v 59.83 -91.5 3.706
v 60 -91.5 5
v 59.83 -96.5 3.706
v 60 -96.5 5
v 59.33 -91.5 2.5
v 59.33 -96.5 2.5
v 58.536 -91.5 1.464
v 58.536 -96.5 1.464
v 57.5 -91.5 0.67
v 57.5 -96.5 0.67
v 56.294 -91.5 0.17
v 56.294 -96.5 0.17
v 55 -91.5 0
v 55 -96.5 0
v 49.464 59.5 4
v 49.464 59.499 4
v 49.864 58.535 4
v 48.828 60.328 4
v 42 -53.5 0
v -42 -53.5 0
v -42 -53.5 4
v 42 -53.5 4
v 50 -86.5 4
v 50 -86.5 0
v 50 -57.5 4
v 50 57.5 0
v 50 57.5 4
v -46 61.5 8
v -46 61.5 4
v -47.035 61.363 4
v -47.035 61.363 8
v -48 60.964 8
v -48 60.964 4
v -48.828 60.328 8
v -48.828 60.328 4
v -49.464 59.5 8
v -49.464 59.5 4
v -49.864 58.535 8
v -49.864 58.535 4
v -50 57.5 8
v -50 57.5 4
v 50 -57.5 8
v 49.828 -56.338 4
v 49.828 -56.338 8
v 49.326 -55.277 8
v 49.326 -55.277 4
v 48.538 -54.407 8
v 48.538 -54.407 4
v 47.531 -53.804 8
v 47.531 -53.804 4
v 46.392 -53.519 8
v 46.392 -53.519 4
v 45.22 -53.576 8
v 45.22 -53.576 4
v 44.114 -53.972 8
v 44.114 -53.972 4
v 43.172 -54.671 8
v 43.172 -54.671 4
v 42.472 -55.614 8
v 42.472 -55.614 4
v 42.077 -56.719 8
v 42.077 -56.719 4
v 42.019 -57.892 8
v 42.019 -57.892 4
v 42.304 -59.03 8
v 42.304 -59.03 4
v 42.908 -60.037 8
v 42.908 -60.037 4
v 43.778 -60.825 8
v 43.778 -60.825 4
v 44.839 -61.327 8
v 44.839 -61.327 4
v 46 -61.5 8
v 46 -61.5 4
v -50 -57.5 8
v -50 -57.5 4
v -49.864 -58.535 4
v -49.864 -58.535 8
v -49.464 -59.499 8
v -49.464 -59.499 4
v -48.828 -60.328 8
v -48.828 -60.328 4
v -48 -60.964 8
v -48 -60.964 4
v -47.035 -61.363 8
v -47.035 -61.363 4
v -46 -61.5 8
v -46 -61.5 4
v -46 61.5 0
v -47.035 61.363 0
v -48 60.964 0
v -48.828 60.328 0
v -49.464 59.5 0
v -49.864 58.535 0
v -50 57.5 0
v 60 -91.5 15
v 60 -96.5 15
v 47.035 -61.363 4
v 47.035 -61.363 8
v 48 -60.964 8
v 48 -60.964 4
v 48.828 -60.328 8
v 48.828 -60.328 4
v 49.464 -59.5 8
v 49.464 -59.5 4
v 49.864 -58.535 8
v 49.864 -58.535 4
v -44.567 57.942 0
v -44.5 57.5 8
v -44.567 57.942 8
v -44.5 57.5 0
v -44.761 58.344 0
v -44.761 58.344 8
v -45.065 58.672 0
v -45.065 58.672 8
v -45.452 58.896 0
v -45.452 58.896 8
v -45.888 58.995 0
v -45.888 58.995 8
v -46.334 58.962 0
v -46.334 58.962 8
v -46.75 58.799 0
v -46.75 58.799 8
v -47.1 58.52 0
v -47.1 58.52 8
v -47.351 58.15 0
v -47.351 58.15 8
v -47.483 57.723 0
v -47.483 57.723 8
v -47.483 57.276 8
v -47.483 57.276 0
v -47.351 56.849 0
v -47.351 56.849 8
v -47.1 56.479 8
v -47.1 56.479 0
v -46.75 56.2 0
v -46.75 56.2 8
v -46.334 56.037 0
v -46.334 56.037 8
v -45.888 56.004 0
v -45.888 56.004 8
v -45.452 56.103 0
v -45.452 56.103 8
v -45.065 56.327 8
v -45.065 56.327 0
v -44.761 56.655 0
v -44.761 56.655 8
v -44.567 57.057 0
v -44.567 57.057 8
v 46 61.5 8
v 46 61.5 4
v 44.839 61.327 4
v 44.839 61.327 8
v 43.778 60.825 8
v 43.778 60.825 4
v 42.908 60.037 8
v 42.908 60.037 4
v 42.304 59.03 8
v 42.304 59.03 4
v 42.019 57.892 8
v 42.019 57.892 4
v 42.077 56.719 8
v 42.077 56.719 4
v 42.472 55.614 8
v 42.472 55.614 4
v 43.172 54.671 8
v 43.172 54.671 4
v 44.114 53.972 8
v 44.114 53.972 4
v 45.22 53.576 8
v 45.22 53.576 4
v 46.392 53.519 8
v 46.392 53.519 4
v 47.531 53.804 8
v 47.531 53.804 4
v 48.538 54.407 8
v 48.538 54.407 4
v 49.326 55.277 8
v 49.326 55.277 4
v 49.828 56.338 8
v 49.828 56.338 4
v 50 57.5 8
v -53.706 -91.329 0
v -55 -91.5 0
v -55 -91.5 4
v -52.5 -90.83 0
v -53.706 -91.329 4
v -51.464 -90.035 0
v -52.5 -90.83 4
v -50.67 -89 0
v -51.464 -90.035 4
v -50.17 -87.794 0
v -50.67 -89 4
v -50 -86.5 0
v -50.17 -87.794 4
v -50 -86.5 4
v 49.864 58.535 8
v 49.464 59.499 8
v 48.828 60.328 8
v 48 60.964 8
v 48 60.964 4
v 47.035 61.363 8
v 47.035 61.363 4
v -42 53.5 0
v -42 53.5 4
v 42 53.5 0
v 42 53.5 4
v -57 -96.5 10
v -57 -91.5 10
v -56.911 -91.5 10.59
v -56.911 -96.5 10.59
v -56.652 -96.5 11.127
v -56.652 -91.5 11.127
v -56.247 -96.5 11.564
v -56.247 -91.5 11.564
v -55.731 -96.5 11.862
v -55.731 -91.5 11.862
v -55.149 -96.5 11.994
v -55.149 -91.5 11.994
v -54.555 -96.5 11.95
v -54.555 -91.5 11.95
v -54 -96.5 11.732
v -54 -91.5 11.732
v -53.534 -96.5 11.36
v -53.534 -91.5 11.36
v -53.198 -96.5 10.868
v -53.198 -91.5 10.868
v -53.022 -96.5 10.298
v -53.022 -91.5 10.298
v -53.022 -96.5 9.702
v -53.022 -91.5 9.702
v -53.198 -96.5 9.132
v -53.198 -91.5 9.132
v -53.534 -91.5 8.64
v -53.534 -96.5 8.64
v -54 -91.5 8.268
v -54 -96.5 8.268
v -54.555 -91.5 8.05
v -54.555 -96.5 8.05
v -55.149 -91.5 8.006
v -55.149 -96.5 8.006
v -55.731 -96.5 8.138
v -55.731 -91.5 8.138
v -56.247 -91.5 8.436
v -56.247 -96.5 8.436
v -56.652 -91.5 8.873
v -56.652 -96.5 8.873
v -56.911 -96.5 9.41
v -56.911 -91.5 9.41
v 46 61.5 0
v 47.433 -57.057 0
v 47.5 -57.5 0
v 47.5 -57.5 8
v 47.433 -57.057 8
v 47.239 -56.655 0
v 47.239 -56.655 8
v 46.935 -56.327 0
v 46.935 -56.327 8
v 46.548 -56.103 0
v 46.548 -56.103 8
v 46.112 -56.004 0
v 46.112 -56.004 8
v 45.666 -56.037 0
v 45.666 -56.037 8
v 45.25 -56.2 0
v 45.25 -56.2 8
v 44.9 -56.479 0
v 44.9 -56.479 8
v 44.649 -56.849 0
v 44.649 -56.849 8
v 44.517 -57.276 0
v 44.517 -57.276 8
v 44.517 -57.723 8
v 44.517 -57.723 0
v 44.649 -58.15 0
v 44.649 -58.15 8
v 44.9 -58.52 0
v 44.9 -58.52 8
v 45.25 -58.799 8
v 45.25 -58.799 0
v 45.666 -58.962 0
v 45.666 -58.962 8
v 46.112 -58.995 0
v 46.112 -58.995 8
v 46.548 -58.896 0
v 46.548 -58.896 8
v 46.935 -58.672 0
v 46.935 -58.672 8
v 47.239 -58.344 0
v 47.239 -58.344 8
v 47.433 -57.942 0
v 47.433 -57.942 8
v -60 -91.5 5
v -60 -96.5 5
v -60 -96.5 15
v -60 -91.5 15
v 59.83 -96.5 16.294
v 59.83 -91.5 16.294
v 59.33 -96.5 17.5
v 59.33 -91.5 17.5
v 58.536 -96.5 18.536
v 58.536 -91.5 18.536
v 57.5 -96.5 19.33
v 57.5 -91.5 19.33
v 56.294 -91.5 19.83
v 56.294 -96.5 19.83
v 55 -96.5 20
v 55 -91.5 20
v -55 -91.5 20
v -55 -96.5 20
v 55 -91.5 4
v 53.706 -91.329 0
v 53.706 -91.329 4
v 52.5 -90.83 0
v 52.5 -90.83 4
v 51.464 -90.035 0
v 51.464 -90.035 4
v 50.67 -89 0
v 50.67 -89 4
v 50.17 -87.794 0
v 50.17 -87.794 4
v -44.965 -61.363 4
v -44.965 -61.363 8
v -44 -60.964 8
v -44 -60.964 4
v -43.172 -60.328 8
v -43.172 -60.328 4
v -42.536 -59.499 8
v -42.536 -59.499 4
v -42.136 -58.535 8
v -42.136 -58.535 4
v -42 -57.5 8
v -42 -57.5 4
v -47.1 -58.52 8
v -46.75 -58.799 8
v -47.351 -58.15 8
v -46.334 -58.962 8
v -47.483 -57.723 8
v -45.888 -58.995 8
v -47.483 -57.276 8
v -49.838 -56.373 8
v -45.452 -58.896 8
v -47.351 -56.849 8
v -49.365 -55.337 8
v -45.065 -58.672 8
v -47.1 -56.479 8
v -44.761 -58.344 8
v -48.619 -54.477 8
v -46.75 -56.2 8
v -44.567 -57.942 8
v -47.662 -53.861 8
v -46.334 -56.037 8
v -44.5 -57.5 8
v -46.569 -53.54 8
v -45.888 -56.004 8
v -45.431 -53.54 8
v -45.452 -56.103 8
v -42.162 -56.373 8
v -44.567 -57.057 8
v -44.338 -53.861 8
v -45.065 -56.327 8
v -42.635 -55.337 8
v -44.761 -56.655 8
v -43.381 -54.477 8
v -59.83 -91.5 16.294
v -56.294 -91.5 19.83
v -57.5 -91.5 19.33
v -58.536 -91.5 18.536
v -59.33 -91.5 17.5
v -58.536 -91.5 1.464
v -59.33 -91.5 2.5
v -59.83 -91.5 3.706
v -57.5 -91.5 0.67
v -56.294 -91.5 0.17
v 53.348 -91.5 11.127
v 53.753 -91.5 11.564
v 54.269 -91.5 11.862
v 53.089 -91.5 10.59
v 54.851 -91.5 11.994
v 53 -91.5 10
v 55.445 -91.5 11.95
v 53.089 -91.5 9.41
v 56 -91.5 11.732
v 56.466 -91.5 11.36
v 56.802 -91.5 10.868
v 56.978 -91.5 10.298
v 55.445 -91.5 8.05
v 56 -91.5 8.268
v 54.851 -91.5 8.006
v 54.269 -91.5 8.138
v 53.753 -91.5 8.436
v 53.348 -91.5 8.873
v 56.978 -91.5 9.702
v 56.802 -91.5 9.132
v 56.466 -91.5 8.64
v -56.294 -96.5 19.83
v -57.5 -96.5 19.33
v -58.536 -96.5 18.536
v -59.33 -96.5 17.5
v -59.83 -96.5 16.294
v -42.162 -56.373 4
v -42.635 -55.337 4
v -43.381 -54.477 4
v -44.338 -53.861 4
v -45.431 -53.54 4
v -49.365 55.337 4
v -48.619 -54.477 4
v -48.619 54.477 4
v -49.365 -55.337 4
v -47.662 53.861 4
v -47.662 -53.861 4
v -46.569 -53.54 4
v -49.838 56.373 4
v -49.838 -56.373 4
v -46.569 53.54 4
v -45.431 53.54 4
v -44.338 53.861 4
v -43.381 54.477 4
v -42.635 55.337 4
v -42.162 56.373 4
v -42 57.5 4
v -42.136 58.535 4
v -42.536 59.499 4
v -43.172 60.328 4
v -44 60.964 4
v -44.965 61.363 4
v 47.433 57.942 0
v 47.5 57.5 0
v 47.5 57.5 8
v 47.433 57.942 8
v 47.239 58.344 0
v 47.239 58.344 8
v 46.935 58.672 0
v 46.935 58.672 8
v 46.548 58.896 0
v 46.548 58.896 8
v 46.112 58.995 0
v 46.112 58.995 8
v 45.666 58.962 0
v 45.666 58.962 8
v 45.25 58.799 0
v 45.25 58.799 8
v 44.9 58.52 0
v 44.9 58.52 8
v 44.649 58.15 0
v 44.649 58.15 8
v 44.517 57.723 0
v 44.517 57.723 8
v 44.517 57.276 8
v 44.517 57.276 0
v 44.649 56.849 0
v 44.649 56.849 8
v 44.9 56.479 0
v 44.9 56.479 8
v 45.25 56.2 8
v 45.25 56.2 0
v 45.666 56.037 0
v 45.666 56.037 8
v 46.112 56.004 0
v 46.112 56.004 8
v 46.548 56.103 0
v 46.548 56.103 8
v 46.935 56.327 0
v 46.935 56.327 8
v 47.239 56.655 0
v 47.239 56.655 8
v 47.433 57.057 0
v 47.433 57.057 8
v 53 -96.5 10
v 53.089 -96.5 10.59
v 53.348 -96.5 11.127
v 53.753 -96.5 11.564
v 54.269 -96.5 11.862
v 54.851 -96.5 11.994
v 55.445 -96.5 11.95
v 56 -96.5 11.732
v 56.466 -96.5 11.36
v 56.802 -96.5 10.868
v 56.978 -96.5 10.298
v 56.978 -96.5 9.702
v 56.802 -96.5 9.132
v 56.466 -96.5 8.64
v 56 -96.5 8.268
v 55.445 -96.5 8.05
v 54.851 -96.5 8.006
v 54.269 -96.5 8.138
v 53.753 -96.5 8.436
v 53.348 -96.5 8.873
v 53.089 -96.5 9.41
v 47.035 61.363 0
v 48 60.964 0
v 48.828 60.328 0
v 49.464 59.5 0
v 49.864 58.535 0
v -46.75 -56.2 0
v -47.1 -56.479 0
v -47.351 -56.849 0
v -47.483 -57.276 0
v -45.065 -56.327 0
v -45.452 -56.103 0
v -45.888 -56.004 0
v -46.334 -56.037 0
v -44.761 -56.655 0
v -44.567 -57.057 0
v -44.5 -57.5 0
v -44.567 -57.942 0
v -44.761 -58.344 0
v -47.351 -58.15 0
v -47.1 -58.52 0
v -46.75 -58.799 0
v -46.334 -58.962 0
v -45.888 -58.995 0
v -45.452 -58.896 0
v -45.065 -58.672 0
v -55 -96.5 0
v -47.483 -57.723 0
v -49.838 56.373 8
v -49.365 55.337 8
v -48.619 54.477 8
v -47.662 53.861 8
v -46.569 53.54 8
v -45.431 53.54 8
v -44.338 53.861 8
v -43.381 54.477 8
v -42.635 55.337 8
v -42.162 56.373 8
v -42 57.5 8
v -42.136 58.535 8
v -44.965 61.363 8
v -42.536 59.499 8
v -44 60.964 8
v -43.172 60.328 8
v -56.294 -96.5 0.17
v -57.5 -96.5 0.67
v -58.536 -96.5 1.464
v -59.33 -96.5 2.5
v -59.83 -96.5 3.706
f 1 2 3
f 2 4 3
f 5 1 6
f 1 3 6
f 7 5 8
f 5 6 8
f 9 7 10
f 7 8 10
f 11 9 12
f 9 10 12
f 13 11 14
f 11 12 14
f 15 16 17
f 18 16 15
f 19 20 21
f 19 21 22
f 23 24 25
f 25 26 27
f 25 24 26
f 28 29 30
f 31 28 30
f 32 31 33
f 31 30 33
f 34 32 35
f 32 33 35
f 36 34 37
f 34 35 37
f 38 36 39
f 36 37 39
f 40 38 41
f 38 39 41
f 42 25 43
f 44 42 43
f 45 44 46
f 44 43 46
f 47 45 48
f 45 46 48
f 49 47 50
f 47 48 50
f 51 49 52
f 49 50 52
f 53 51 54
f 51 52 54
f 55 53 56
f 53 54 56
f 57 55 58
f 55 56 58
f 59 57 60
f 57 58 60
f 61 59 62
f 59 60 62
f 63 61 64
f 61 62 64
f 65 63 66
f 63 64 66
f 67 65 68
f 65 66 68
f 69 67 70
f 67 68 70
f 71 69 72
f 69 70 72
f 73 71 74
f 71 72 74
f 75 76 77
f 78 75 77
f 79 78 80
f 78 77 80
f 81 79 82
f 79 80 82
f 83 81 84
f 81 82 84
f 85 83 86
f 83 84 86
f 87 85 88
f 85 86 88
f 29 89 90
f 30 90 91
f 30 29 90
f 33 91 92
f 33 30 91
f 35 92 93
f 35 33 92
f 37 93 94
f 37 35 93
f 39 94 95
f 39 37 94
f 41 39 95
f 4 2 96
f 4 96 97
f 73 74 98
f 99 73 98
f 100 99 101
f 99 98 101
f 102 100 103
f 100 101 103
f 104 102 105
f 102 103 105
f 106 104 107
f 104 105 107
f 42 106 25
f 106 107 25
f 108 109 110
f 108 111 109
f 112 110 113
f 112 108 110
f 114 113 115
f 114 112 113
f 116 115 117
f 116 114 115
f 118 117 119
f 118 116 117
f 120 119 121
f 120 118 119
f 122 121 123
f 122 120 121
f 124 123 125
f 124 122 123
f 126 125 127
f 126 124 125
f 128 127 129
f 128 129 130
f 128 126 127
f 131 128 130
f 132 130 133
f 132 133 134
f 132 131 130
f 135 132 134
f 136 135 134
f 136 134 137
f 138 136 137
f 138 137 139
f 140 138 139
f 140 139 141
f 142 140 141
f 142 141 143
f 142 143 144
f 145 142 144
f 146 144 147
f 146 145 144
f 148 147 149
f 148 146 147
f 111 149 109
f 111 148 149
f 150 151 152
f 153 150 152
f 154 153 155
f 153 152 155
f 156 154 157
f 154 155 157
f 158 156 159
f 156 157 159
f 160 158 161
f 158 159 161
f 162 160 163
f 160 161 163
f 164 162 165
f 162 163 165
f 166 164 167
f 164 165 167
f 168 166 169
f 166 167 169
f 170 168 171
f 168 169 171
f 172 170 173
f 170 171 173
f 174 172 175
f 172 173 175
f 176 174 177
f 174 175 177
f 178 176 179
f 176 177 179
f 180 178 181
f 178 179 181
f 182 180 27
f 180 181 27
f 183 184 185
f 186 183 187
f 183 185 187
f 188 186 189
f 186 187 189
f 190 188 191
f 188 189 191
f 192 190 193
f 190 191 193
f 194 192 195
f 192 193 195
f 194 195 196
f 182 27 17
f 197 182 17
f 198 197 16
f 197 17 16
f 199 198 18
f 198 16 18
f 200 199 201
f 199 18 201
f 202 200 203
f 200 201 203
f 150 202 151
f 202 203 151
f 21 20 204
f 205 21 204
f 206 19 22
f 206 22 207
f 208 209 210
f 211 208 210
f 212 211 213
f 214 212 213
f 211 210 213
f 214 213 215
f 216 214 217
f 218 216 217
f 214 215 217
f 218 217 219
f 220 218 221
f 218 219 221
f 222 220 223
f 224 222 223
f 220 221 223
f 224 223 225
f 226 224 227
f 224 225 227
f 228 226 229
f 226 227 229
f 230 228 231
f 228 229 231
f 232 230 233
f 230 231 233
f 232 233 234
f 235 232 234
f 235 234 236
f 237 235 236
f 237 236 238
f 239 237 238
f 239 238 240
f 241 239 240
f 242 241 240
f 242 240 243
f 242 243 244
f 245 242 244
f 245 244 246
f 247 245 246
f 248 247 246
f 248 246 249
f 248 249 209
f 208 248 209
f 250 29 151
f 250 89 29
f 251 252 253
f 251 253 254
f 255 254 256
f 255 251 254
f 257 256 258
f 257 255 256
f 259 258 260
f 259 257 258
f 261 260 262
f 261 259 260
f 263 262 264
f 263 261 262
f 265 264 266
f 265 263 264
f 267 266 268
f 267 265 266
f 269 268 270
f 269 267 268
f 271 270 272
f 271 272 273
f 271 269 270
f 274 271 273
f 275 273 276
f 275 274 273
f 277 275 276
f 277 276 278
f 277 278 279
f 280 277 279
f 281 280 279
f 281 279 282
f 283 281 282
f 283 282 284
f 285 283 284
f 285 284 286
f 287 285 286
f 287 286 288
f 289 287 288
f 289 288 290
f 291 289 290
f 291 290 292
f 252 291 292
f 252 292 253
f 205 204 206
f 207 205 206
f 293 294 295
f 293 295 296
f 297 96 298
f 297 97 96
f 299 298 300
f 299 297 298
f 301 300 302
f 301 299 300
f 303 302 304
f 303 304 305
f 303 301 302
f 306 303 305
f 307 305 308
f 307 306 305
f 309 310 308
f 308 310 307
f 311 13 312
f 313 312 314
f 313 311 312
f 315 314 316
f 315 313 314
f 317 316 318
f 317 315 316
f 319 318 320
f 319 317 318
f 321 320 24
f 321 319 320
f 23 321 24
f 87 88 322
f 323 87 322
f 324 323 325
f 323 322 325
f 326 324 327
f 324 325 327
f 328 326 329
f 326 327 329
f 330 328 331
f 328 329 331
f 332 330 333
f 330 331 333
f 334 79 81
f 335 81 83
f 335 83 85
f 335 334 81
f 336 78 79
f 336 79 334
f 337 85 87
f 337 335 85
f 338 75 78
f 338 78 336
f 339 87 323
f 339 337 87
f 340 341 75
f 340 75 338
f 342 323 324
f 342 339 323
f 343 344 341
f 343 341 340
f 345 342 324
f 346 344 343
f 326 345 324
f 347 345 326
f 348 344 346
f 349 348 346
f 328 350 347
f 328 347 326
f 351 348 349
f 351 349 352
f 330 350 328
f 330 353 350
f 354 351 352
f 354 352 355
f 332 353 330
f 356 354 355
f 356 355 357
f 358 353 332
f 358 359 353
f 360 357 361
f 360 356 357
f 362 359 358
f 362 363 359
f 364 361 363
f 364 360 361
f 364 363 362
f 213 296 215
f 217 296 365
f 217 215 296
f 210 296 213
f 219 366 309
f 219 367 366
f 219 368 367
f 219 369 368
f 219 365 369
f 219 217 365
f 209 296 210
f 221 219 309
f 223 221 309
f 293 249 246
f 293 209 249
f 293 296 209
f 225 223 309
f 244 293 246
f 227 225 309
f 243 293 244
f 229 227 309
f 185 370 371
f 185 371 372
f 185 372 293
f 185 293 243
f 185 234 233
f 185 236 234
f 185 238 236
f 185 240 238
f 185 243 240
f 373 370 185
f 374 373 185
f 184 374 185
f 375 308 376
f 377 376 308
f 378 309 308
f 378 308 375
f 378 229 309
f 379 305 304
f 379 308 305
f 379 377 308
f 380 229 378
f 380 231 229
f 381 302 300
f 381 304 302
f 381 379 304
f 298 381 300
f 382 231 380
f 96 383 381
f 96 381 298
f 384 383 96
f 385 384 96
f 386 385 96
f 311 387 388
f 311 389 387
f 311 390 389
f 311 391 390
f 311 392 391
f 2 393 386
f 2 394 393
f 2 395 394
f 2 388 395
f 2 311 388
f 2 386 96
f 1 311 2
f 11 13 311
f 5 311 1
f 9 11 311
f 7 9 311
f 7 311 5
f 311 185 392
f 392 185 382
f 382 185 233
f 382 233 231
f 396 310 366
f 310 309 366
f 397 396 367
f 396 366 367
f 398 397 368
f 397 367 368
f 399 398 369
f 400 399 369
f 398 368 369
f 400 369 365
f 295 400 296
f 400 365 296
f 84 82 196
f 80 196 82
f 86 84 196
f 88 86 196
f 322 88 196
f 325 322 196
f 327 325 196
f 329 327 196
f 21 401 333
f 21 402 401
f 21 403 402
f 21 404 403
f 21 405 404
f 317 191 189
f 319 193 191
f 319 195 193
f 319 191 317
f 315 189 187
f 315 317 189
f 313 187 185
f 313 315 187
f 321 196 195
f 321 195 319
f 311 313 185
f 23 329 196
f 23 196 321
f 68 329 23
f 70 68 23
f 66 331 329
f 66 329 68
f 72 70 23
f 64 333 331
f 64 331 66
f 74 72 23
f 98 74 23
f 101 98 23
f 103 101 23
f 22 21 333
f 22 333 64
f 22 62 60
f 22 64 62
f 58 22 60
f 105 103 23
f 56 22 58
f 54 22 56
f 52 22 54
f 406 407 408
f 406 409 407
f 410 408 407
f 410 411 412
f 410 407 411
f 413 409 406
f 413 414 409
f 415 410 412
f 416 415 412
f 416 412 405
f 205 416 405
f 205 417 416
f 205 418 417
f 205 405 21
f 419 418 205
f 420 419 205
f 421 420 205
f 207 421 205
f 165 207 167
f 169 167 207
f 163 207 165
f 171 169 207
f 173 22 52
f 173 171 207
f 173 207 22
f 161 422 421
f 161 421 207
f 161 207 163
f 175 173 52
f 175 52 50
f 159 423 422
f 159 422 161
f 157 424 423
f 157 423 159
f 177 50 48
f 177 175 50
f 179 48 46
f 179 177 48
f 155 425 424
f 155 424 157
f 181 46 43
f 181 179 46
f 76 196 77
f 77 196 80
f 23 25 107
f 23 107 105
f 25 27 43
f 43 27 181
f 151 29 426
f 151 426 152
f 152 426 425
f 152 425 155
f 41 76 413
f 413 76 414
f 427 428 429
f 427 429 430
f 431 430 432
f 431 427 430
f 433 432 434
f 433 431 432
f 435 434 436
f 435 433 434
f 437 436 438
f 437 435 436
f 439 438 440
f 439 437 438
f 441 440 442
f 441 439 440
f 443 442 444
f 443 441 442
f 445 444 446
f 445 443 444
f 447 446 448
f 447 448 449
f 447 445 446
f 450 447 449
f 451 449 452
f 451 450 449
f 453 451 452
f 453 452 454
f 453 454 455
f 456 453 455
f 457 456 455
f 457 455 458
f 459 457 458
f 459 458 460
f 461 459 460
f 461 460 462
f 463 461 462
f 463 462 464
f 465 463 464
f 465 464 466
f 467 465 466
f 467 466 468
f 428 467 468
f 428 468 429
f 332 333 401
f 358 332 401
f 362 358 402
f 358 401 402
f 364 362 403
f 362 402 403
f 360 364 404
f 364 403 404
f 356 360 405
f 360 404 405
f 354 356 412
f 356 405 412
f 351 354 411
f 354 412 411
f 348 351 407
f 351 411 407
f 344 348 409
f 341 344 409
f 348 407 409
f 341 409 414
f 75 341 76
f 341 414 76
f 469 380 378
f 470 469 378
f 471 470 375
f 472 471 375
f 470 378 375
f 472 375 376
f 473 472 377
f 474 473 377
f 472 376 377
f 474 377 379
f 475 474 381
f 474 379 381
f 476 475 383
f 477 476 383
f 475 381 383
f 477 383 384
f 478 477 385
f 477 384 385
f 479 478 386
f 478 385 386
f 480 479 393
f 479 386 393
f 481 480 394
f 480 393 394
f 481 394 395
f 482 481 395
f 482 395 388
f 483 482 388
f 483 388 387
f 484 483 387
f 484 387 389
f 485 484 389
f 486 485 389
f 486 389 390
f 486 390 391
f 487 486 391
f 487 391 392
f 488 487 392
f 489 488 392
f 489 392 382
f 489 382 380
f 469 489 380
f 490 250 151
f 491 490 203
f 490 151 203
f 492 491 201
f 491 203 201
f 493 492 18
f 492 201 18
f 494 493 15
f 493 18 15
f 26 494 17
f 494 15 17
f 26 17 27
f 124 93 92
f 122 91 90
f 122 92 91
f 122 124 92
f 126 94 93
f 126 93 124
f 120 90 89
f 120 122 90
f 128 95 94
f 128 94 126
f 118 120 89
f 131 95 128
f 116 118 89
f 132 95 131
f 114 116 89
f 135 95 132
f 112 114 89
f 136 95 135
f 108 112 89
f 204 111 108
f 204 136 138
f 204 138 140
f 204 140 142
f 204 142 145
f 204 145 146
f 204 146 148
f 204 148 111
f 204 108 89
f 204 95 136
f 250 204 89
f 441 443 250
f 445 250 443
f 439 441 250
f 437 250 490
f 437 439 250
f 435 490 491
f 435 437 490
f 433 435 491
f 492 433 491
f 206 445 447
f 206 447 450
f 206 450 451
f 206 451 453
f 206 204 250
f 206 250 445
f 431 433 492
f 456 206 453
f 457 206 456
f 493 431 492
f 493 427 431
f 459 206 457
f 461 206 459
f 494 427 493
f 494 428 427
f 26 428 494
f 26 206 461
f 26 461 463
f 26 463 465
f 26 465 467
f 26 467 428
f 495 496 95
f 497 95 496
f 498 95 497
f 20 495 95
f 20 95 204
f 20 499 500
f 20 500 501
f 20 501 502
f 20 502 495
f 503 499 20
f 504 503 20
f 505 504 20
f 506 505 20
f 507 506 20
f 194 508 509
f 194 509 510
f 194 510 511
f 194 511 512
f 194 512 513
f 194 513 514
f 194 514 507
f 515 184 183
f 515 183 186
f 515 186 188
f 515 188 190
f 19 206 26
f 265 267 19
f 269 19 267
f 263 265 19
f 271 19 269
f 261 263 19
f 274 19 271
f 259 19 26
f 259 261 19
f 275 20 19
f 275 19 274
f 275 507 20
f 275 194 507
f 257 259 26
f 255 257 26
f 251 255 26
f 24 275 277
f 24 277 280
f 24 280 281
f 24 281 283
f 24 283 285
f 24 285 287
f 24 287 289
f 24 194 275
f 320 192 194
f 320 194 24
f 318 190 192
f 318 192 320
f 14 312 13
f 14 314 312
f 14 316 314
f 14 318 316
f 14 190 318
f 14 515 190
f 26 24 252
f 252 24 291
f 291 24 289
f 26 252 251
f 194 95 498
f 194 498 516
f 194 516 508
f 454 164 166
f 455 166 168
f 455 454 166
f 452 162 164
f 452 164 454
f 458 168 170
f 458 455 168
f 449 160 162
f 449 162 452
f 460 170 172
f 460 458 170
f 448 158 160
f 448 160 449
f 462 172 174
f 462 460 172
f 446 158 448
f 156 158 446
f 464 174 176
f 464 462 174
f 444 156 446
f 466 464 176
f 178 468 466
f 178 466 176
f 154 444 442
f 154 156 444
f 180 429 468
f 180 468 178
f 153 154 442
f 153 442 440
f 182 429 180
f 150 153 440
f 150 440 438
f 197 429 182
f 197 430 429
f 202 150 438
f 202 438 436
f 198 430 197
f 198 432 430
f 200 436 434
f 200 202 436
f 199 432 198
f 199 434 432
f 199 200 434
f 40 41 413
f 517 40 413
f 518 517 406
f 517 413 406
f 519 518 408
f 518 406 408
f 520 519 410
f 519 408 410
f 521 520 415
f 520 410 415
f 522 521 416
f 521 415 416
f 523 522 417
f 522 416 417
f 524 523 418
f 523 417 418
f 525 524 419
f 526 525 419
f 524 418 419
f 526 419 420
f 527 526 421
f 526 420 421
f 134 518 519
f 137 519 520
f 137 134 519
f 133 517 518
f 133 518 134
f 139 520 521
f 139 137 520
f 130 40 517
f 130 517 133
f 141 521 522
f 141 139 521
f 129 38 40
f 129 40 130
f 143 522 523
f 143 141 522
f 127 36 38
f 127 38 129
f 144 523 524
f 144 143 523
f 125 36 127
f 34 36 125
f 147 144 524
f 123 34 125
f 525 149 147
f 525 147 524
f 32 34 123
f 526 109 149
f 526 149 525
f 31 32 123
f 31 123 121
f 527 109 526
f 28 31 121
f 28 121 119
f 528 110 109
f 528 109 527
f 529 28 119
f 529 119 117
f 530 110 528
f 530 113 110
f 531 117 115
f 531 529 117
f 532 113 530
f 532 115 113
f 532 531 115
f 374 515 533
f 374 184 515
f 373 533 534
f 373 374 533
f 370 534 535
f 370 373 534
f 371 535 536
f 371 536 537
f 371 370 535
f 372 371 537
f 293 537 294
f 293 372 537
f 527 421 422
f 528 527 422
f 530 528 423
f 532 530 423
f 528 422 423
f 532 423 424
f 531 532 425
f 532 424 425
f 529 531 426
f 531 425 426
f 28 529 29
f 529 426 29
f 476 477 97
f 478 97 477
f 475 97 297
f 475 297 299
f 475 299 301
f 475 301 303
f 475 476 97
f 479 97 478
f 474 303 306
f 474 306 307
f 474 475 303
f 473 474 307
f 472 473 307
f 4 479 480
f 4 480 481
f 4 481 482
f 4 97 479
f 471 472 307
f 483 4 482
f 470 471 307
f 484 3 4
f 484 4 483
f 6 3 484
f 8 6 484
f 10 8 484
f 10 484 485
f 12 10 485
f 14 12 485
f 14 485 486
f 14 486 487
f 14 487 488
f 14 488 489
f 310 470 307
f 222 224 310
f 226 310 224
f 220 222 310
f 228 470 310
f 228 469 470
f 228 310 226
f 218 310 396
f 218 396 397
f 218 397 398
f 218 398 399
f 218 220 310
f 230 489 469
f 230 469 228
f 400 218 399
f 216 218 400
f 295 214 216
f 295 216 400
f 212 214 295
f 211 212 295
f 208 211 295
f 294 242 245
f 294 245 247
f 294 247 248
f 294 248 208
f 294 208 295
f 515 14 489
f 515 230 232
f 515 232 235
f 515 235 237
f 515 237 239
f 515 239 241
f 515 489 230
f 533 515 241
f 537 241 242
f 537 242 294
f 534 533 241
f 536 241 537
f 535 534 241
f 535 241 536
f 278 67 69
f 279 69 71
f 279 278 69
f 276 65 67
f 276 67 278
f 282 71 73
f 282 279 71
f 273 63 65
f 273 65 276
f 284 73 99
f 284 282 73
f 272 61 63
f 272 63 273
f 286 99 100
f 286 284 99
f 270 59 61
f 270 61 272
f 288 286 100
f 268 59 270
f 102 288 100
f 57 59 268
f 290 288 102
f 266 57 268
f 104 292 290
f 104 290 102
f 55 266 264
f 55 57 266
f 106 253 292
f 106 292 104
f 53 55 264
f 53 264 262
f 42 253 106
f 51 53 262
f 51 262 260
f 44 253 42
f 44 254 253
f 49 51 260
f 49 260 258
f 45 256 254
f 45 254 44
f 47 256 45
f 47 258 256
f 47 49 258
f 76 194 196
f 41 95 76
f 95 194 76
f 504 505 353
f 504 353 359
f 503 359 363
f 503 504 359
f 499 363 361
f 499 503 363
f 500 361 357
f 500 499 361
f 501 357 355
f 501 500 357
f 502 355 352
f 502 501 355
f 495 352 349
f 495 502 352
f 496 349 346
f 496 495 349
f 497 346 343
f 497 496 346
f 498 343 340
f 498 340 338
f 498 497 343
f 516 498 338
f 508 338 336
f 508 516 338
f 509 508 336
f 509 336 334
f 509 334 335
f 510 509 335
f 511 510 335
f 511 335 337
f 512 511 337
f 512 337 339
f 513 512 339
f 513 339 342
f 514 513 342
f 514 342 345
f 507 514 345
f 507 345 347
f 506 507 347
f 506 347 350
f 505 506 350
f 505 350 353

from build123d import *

# Parameters (mm, degrees)
F0_W      = 100
F0_H      = 122.999
F0_R      = 1.5
F0_W_2    = 84
F0_H_2    = 106.999
F1_DEPTH  = 4
F2_R      = 1.5
F3_DEPTH  = 4
F4_W      = 100
F4_H      = 4
F5_DEPTH  = 30
F7_DEPTH  = 20
F8_R      = 4.99999
F9_R      = 3.9999
F10_R     = 2
F11_DEPTH = 10


# Not quite as in the source:
# - a fillet or chamfer is up to 0.001 mm smaller than in the source, because OpenCascade refuses the exact size


with BuildPart() as f1:
    # F0 (on Top) → F1 (new body)
    with BuildSketch(Plane.XY):
        Rectangle(F0_W, F0_H)
        with Locations((-46, -57.4995)):
            Circle(F0_R, mode=Mode.SUBTRACT)
        with Locations((46, -57.4995)):
            Circle(F0_R, mode=Mode.SUBTRACT)
        with Locations((-46, 57.4995)):
            Circle(F0_R, mode=Mode.SUBTRACT)
        Rectangle(F0_W_2, F0_H_2, mode=Mode.SUBTRACT)
        with Locations((46, 57.4995)):
            Circle(F0_R, mode=Mode.SUBTRACT)
    extrude(amount=F1_DEPTH)

    # F2 (on face) → F3 (join)
    with BuildSketch(Plane.XY.offset(4)):
        with BuildLine():
            ThreePointArc((-42, 57.4995), (-43.1715728523, 60.3279271017), (-45.999999935, 61.4995))
            ThreePointArc((-45.999999935, 61.4995), (-48.8284271017, 60.3279271477), (-50, 57.4995))
            ThreePointArc((-50, 57.4995), (-46, 53.4995), (-42, 57.4995))
        make_face()
        with Locations((-46, 57.4995)):
            Circle(F2_R, mode=Mode.SUBTRACT)
        with BuildLine():
            ThreePointArc((46, 61.4995), (43.1715728753, 54.6710728753), (50, 57.4995))
            ThreePointArc((50, 57.4995), (48.8284271247, 60.3279271247), (46, 61.4995))
        make_face()
        with Locations((46, 57.4995)):
            Circle(F2_R, mode=Mode.SUBTRACT)
        with BuildLine():
            ThreePointArc((45.9999999936, -61.4995), (48.8284271225, -60.327927127), (50, -57.4995))
            ThreePointArc((50, -57.4995), (43.1715728775, -54.671072873), (45.9999999936, -61.4995))
        make_face()
        with Locations((46, -57.4995)):
            Circle(F2_R, mode=Mode.SUBTRACT)
        with BuildLine():
            ThreePointArc((-50, -57.4995), (-48.8284271247, -60.3279271247), (-46, -61.4995))
            ThreePointArc((-46, -61.4995), (-43.1715728753, -60.3279271247), (-42, -57.4995))
            ThreePointArc((-42, -57.4995), (-46, -53.4995), (-50, -57.4995))
        make_face()
        with Locations((-46, -57.4995)):
            Circle(F2_R, mode=Mode.SUBTRACT)
    extrude(amount=F3_DEPTH)

    # F4 (on face) → F5 (join)
    with BuildSketch(Plane.XZ.offset(61.4995)):
        with Locations((0, 2)):
            Rectangle(F4_W, F4_H)
    extrude(amount=F5_DEPTH)

    # F6 (on face) → F7 (join)
    with BuildSketch(Plane(origin=(0, 0, 0), x_dir=(1, 0, 0), z_dir=(0, 0, -1))):
        Polygon((50, 91.4995), (60, 91.4995), (60, 96.4995), (-50, 96.4995), (-60, 96.4995), (-60, 91.4995), (-50, 91.4995), align=None)
    extrude(amount=-F7_DEPTH)

    # F8 (radius 5 in the source; OpenCascade refuses exactly that, so slightly less here)
    f8_edges = [f1.edges().sort_by_distance(p)[0] for p in [
        (-60, -93.9995, 20),
        (-60, -93.9995, 0),
        (60, -93.9995, 0),
        (60, -93.9995, 20),
        (50, -91.4995, 2),
        (-50, -91.4995, 2),
    ]]
    fillet(f8_edges, radius=F8_R)

    # F9 (radius 4 in the source; OpenCascade refuses exactly that, so slightly less here)
    f9_edges = [f1.edges().sort_by_distance(p)[0] for p in [
        (50, 61.4995, 2),
        (-50, 61.4995, 2),
    ]]
    fillet(f9_edges, radius=F9_R)

    # F10 (on face) → F11 (cut)
    with BuildSketch(Plane(origin=(0, -91.4995, 0), x_dir=(-1, 0, 0), z_dir=(0, 1, 0))):
        with Locations((55, 10)):
            Circle(F10_R)
        with Locations((-55, 10)):
            Circle(F10_R)
    extrude(amount=-F11_DEPTH, mode=Mode.SUBTRACT)


solid = f1.part
